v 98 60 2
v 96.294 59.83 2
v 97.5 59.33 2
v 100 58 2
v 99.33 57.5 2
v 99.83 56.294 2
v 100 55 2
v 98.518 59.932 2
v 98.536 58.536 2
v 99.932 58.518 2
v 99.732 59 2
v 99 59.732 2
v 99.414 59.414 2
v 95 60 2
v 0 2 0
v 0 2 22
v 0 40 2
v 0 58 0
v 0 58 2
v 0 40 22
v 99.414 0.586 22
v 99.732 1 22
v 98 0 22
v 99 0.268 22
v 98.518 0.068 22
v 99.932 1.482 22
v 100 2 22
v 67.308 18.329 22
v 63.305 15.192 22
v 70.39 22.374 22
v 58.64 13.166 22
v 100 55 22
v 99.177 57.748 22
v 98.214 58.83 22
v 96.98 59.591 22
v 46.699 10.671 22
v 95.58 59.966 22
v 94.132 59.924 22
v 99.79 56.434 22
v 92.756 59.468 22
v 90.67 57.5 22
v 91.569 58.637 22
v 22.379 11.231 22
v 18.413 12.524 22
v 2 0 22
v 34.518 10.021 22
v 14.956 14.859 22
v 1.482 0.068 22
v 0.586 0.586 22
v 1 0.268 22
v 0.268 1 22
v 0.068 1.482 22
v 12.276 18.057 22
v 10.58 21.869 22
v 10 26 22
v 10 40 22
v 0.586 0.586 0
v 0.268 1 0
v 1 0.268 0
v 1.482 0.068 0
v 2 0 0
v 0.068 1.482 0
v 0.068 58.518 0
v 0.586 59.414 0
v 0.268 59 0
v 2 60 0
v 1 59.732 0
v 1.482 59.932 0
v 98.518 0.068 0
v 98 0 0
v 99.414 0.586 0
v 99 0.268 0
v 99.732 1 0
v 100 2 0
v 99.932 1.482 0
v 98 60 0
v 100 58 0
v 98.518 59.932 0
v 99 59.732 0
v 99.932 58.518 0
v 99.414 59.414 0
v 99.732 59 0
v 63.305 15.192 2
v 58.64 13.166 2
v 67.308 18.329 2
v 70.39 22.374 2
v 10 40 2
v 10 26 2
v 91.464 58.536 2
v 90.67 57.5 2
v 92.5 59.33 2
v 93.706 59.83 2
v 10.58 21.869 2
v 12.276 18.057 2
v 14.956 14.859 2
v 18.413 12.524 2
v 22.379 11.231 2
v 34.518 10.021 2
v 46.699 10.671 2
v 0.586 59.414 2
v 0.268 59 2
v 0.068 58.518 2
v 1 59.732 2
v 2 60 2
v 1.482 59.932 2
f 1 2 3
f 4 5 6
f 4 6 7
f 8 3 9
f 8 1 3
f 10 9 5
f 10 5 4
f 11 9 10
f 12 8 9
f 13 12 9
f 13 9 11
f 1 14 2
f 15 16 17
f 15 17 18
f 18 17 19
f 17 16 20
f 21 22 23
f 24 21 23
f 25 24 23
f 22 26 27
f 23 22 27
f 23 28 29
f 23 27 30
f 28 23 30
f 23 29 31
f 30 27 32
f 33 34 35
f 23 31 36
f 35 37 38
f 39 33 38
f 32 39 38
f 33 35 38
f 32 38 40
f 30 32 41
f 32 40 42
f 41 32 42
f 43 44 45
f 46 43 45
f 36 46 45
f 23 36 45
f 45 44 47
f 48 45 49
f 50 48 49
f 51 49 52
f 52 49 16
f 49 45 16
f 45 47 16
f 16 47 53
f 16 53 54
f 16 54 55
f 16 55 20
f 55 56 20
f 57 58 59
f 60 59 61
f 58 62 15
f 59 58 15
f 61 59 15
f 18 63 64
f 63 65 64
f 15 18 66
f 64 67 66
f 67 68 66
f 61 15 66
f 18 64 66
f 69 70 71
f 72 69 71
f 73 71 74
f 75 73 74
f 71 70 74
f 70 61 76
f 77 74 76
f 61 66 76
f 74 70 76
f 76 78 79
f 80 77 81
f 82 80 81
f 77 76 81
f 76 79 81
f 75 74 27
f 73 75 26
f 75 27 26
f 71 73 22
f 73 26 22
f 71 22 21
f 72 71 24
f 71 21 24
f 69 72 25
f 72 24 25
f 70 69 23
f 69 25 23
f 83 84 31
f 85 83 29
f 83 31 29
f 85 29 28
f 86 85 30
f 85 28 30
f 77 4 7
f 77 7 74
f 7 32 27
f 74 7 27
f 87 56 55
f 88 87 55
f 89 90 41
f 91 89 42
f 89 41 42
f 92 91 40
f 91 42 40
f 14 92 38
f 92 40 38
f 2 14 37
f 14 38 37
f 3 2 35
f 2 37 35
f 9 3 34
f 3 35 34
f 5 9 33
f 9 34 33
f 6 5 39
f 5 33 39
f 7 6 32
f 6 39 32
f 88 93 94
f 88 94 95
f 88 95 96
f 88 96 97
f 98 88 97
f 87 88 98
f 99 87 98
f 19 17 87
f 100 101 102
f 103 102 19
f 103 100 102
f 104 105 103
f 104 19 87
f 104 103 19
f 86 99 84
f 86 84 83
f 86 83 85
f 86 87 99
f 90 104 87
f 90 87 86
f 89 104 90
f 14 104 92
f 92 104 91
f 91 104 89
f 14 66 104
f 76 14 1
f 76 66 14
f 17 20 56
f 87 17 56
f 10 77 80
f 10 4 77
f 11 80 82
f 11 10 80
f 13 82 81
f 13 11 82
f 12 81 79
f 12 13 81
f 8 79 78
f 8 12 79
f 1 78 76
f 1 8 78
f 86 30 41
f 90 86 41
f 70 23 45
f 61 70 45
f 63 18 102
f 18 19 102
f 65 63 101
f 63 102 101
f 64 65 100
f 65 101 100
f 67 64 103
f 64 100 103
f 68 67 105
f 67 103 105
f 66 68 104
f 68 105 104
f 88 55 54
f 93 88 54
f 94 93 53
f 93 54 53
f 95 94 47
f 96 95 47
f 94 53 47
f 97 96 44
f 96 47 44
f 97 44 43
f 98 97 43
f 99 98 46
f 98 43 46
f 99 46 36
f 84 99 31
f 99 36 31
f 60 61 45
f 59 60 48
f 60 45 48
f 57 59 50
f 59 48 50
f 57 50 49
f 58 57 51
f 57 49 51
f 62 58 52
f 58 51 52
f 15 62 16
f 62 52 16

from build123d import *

# Parameters (mm, degrees)
CROQUIS1_W              = 100
CROQUIS1_H              = 60
SALIENTE_EXTRUIR1_DEPTH = 2
REDONDEO1_R             = 2
SALIENTE_EXTRUIR2_START = 20
SALIENTE_EXTRUIR2_DEPTH = 20


with BuildPart() as part:
    # Croquis1 → Saliente-Extruir1 (new body)
    with BuildSketch(Plane.XY):
        with Locations((50, 30)):
            Rectangle(CROQUIS1_W, CROQUIS1_H)
    extrude(amount=SALIENTE_EXTRUIR1_DEPTH)

    # Redondeo1
    redondeo1_edges = [part.edges().sort_by_distance(p)[0] for p in [
        (0, 60, 1),
        (100, 60, 1),
        (100, 0, 1),
        (0, 0, 1),
    ]]
    fillet(redondeo1_edges, radius=REDONDEO1_R)

    # Croquis2 → Saliente-Extruir2 (add)
    with BuildSketch(Plane.XY.offset(2).offset(SALIENTE_EXTRUIR2_START)):
        with BuildLine():
            Line((70.390057163, 22.374328634), (90.669872981, 57.5))
            ThreePointArc((90.669872981, 57.5), (96.294095226, 59.829629131), (100, 55))
            Line((100, 55), (100, 2))
            ThreePointArc((100, 2), (99.414213562, 0.585786438), (98, 0))
            Line((98, 0), (2, 0))
            ThreePointArc((2, 0), (0.585786438, 0.585786438), (0, 2))
            Line((0, 2), (0, 40))
            Line((0, 40), (10, 40))
            Line((10, 40), (10, 26))
            ThreePointArc((10, 26), (13.504011149, 16.364532168), (22.378965379, 11.230769231))
            ThreePointArc((22.378965379, 11.230769231), (40.620786832, 10.113661458), (58.640126552, 13.165771512))
            ThreePointArc((58.640126552, 13.165771512), (65.406478623, 16.632658786), (70.390057163, 22.374328634))
        make_face()
    extrude(amount=-SALIENTE_EXTRUIR2_DEPTH)


solid = part.part
